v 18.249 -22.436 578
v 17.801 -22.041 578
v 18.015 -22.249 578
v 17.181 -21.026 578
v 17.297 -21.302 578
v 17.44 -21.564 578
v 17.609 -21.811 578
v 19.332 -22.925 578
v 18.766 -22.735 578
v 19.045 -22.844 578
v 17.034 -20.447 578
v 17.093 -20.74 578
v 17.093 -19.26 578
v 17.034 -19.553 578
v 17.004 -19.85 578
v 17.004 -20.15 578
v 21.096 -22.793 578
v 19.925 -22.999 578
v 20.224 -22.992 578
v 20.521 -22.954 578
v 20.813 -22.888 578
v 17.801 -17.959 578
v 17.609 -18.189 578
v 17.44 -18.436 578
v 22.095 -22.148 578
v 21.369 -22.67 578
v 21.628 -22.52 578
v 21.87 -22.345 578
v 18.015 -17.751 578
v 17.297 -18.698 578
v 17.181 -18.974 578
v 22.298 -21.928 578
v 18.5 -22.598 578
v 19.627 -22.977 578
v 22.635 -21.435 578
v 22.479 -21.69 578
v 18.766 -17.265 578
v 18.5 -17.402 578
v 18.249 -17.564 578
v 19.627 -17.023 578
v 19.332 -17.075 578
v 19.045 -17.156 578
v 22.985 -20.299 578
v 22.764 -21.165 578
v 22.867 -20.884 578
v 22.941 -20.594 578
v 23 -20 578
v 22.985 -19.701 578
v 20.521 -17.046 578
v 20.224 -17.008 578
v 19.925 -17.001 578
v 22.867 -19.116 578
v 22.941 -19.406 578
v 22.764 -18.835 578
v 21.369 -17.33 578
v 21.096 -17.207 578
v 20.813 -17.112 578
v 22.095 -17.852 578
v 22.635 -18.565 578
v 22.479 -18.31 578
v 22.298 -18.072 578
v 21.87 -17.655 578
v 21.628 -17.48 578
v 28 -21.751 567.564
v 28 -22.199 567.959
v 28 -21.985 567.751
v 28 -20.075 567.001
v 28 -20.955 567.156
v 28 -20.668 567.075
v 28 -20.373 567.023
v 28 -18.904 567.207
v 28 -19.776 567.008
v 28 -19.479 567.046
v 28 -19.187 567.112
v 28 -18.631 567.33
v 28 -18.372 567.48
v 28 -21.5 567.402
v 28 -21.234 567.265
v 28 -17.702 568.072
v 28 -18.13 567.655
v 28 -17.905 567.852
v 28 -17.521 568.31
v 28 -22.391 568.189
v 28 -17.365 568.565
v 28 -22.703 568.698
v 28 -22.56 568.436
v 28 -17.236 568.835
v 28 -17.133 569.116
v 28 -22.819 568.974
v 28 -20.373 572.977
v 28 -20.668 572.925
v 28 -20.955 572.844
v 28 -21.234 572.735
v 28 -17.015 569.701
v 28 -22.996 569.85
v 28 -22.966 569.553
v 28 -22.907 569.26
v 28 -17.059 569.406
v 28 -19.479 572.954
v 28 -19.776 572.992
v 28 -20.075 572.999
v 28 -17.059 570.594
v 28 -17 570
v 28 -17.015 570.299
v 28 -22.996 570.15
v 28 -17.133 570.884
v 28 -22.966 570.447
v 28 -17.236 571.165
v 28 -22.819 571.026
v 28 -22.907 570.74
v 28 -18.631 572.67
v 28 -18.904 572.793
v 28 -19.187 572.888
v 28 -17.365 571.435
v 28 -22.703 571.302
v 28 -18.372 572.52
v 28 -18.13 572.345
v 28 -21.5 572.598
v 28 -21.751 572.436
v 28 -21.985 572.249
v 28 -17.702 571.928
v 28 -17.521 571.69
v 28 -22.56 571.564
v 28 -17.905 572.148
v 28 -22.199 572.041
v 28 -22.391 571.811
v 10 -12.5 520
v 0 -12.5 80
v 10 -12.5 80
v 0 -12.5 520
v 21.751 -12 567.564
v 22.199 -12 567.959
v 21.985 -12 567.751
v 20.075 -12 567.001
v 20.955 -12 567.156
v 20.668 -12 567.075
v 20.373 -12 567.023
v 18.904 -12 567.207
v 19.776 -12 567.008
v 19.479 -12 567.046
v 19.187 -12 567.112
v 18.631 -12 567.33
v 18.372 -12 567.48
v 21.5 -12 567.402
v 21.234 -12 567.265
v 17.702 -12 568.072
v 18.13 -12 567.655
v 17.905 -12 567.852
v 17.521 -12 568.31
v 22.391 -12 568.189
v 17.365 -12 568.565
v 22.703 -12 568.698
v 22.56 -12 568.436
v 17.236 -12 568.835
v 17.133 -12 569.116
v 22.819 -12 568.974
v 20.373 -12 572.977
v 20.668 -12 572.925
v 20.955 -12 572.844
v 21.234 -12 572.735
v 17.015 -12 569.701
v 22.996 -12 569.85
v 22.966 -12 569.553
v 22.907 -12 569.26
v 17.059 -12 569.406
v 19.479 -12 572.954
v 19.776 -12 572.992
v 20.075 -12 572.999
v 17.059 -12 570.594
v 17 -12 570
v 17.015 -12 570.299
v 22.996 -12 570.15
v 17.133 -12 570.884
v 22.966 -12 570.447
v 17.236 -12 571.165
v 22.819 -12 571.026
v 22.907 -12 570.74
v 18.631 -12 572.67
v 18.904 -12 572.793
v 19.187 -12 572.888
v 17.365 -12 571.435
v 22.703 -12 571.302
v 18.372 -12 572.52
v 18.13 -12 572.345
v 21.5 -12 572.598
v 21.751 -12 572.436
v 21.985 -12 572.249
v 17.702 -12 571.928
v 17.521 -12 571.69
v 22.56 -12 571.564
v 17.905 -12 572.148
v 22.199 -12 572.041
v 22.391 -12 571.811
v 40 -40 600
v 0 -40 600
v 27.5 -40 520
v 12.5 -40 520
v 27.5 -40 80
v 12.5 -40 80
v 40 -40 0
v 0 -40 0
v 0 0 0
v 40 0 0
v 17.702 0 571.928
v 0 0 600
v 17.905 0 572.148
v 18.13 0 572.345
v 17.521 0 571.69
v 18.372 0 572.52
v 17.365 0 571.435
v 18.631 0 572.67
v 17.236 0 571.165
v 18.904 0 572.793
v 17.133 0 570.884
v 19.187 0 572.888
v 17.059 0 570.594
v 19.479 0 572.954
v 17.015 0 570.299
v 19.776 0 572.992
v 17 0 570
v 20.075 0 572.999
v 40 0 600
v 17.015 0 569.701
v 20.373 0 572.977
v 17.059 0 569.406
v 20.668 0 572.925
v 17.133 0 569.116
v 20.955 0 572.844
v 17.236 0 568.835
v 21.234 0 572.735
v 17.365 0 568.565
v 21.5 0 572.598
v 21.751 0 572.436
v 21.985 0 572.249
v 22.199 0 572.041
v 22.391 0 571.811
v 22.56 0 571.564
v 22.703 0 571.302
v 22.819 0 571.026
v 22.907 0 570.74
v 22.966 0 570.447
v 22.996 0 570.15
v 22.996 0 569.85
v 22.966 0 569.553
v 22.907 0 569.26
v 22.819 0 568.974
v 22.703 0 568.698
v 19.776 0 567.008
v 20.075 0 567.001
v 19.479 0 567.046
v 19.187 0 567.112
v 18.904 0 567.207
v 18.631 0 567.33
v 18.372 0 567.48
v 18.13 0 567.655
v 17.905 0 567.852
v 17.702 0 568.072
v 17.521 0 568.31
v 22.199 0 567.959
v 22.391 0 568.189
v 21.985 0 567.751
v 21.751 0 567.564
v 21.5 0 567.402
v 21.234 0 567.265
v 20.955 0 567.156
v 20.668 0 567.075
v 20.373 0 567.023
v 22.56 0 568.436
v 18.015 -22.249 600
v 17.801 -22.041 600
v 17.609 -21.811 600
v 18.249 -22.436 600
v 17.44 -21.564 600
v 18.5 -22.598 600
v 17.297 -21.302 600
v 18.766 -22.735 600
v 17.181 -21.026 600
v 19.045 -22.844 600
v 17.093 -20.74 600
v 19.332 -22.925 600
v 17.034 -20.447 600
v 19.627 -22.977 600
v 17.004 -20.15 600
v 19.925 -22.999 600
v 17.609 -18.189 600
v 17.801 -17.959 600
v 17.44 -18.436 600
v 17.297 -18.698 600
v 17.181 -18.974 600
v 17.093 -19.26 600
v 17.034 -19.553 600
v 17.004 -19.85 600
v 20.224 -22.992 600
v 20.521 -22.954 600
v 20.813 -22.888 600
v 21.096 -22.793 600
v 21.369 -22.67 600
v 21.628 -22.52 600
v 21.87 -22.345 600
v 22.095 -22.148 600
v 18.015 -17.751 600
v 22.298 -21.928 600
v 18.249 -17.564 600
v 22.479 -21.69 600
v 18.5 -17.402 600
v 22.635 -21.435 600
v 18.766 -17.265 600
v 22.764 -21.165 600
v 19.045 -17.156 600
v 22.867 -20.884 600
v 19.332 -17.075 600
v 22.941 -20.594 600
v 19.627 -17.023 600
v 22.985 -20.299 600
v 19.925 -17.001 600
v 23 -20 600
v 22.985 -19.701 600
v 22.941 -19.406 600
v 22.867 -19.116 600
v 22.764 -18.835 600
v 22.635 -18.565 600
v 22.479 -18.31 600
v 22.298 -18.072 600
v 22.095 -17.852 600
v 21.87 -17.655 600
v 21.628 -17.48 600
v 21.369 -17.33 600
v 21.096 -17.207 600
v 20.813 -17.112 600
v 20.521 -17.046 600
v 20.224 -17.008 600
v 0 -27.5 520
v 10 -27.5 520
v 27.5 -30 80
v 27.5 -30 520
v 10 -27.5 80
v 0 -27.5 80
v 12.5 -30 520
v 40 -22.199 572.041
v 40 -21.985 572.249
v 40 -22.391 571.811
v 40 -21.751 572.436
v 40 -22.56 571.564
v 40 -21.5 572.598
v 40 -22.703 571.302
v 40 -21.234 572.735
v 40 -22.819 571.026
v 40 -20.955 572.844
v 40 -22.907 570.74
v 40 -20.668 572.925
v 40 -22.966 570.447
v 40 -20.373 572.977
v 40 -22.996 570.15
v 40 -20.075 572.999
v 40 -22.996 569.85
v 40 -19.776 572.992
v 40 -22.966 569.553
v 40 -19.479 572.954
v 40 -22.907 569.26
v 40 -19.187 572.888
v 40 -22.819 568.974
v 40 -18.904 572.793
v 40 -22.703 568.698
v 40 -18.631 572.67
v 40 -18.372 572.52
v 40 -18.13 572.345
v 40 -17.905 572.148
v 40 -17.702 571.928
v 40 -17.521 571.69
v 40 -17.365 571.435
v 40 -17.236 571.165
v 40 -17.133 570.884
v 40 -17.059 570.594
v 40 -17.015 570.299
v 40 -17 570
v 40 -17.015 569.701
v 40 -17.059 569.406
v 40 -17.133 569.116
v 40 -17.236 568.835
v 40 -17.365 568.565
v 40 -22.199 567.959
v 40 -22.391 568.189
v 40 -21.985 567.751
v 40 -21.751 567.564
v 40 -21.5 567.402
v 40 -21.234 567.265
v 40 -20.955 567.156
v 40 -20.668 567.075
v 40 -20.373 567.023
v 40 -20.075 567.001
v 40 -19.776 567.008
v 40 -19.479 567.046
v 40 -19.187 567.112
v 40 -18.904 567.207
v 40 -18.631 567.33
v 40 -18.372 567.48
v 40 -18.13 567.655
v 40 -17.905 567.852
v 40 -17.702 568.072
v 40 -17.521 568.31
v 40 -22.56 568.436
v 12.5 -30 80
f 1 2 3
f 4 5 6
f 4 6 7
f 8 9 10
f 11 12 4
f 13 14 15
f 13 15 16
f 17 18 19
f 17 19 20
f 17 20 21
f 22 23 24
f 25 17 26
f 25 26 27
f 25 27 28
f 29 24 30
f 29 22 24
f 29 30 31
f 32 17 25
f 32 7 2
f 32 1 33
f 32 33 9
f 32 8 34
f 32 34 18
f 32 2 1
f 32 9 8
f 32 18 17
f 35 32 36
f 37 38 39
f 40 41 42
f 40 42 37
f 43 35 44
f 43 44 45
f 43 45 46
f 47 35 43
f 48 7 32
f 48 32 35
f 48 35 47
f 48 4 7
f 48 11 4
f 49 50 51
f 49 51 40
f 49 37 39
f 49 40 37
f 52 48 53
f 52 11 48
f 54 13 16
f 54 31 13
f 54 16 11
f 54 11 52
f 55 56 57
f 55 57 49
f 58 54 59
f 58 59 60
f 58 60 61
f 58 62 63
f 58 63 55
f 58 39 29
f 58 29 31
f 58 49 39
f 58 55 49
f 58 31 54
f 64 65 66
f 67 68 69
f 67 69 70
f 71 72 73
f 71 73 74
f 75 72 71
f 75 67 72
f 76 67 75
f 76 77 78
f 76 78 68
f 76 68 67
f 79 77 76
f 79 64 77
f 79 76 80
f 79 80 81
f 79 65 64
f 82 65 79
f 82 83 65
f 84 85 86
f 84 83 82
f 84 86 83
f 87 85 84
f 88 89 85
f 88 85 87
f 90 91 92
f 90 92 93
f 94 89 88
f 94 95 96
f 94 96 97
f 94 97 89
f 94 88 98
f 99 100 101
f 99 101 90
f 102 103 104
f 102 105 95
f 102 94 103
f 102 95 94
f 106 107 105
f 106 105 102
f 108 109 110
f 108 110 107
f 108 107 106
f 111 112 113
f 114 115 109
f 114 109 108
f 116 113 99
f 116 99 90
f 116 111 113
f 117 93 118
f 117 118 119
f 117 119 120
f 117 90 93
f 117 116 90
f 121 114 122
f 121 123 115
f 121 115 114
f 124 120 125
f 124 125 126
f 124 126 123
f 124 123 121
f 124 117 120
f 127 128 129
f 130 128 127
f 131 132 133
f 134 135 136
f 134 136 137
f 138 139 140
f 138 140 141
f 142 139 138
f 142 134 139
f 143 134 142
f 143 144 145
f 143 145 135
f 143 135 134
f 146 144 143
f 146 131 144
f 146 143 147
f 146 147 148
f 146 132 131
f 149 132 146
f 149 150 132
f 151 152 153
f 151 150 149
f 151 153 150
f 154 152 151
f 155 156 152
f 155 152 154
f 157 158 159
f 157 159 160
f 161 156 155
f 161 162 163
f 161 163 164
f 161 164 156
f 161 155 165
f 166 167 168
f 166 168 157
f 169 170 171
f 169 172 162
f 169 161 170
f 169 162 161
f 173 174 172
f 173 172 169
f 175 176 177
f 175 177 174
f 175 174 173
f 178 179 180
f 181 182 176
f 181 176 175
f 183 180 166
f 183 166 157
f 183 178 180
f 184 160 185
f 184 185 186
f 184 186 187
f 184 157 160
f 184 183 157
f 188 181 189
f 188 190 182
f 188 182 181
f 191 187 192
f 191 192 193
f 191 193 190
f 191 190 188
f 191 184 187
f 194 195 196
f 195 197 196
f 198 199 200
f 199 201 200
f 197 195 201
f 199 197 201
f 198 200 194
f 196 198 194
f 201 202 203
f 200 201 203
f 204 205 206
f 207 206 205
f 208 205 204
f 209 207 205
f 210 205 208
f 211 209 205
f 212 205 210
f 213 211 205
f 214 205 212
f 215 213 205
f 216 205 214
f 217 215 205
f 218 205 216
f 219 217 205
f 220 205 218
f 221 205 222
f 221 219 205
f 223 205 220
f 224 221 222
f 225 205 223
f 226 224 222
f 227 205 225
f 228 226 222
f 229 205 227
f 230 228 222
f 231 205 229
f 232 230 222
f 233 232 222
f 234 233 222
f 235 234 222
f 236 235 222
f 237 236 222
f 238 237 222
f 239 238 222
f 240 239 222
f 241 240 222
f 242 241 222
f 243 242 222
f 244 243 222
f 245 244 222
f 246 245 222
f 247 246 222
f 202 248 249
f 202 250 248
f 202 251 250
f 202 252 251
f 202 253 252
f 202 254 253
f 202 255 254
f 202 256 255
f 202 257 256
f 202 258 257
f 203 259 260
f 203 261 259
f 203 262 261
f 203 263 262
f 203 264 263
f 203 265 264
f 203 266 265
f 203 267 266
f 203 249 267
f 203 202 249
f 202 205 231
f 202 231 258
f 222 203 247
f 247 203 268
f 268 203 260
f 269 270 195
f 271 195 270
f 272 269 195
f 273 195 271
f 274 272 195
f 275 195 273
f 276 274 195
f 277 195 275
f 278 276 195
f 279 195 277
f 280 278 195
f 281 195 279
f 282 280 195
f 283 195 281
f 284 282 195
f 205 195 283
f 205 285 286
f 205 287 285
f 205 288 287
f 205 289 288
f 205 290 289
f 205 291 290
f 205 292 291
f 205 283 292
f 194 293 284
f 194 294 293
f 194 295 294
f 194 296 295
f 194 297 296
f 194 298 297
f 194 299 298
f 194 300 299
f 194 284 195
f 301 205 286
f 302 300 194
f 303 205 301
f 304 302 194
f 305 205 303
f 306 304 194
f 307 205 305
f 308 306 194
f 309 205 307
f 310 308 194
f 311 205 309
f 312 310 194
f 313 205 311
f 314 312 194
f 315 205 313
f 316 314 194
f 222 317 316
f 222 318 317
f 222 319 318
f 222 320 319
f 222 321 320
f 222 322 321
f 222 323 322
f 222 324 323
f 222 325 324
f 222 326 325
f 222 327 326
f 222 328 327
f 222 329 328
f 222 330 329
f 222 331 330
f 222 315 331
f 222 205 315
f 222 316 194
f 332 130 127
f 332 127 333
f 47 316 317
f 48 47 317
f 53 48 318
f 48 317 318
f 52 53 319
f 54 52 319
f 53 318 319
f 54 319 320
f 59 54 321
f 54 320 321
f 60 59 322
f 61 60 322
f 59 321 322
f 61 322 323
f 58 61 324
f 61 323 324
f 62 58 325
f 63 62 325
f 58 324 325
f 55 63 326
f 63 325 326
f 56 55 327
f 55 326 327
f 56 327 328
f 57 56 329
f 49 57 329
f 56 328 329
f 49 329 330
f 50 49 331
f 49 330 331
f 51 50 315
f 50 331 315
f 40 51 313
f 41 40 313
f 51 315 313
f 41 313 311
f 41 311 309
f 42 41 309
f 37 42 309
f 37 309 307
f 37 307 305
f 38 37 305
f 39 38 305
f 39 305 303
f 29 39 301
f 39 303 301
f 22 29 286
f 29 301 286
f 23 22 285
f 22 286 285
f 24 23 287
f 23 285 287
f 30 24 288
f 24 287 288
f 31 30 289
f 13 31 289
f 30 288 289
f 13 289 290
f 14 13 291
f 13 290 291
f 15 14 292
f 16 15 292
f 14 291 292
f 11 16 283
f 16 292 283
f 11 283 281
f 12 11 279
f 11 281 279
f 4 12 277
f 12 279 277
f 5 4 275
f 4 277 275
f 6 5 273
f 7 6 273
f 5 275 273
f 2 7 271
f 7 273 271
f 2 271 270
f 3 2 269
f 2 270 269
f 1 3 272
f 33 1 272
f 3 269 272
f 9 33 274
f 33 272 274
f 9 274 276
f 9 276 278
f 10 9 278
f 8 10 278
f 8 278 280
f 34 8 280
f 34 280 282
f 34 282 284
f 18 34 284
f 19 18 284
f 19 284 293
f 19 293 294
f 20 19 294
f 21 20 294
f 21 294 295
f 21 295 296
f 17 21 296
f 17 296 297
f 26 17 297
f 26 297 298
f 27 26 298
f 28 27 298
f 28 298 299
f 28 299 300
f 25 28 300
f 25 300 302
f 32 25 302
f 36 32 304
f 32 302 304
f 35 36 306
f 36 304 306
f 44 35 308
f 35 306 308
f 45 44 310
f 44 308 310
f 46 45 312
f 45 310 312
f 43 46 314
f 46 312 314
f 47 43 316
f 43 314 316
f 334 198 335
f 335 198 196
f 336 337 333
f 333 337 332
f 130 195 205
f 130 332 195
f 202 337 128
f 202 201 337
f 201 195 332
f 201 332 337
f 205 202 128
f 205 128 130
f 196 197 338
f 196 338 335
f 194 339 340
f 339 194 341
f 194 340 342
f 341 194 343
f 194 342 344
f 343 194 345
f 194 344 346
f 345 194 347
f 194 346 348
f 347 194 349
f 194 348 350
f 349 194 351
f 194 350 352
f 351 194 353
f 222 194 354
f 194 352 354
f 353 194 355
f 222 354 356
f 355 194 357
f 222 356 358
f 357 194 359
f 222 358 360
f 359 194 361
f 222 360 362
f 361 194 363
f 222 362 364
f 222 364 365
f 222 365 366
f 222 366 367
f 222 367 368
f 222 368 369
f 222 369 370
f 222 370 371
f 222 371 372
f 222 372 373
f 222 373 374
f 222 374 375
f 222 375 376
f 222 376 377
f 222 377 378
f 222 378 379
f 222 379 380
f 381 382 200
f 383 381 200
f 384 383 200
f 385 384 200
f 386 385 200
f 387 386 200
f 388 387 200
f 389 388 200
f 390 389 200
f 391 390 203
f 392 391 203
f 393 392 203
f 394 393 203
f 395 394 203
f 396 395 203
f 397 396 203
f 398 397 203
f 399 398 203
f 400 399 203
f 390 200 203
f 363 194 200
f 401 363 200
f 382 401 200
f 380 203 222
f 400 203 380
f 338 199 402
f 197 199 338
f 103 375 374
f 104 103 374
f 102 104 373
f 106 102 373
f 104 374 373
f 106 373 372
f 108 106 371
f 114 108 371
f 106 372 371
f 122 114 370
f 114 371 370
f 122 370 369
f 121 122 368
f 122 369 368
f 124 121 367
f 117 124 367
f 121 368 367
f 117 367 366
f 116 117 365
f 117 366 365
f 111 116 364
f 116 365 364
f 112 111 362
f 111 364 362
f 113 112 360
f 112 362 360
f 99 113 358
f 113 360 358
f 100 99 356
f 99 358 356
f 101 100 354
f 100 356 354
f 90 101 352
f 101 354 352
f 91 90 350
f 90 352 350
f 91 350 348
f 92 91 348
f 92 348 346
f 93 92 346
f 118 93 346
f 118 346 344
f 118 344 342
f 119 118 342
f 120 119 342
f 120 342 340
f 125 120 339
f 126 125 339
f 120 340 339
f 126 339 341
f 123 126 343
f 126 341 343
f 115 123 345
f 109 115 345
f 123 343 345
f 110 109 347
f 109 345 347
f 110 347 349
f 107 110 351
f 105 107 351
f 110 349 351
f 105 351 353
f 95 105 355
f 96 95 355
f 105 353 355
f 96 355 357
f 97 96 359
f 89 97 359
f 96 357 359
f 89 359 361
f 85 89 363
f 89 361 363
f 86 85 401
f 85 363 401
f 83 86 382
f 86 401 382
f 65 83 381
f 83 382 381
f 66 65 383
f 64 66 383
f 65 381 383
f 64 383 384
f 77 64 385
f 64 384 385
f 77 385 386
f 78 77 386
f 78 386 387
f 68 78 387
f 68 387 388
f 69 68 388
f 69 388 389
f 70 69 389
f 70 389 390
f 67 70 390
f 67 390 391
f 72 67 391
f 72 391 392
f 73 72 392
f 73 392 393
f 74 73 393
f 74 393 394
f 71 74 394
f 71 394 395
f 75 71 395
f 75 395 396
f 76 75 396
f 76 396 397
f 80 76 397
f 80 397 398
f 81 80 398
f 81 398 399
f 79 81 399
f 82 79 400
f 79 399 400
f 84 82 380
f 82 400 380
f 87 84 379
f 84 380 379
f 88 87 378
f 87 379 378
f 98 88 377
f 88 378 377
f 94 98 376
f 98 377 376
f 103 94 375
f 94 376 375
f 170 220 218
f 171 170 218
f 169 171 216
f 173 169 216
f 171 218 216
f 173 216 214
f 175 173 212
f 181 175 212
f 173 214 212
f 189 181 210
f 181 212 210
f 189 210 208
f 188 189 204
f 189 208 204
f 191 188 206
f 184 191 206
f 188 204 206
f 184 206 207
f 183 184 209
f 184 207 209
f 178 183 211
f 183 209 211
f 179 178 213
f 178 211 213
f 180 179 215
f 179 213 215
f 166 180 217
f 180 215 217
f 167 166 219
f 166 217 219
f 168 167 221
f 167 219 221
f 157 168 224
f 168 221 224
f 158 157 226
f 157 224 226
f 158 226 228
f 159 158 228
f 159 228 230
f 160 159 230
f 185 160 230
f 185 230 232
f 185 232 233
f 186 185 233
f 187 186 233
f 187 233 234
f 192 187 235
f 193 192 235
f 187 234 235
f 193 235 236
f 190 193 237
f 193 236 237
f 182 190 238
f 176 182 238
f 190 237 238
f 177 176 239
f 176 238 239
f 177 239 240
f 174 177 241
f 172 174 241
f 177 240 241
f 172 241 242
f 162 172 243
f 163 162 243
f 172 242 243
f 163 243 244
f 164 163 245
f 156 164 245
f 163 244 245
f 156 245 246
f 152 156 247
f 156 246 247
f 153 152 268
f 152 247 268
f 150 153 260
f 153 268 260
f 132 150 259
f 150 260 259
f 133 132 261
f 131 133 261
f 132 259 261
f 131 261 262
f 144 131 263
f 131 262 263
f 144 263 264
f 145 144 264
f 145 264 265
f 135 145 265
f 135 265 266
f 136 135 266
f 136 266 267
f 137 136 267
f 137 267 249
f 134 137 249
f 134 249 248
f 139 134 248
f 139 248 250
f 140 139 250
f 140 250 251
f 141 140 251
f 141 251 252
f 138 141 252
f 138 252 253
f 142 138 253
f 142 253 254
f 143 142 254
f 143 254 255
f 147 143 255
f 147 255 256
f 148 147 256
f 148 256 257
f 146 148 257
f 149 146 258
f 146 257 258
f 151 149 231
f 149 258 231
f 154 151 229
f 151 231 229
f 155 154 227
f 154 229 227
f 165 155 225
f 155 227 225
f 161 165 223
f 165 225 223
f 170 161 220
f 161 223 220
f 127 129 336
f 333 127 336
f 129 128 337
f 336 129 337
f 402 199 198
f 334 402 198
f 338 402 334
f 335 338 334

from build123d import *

# Parameters (mm, degrees)
F0_W      = 40
F0_H      = 40
F1_DEPTH  = 600
F2_R      = 3
F3_DEPTH  = 12
F4_R      = 3
F5_DEPTH  = 12
F6_R      = 3
F7_DEPTH  = 22
F8_W      = 15
F8_H      = 440
F9_DEPTH  = 10
F10_W     = 15
F10_H     = 440
F11_DEPTH = 10


with BuildPart() as f1:
    # F0 (on Top) → F1 (new body)
    with BuildSketch(Plane.XY):
        with Locations((20, -20)):
            Rectangle(F0_W, F0_H)
    extrude(amount=F1_DEPTH)

    # F2 (on face) → F3 (cut)
    with BuildSketch(Plane.YZ.offset(40)):
        with Locations((-20, 570)):
            Circle(F2_R)
    extrude(amount=-F3_DEPTH, mode=Mode.SUBTRACT)

    # F4 (on face) → F5 (cut)
    with BuildSketch(Plane(origin=(0, 0, 0), x_dir=(-1, 0, 0), z_dir=(0, 1, 0))):
        with Locations((-20, 570)):
            Circle(F4_R)
    extrude(amount=-F5_DEPTH, mode=Mode.SUBTRACT)

    # F6 (on face) → F7 (cut)
    with BuildSketch(Plane.XY.offset(600)):
        with Locations((20, -20)):
            Circle(F6_R)
    extrude(amount=-F7_DEPTH, mode=Mode.SUBTRACT)

    # F8 (on face) → F9 (cut)
    with BuildSketch(Plane.XZ.offset(40)):
        with Locations((20, 300)):
            Rectangle(F8_W, F8_H)
    extrude(amount=-F9_DEPTH, mode=Mode.SUBTRACT)

    # F10 (on face) → F11 (cut)
    with BuildSketch(Plane(origin=(0, 0, 0), x_dir=(0, -1, 0), z_dir=(-1, 0, 0))):
        with Locations((20, 300)):
            Rectangle(F10_W, F10_H)
    extrude(amount=-F11_DEPTH, mode=Mode.SUBTRACT)


solid = f1.part
